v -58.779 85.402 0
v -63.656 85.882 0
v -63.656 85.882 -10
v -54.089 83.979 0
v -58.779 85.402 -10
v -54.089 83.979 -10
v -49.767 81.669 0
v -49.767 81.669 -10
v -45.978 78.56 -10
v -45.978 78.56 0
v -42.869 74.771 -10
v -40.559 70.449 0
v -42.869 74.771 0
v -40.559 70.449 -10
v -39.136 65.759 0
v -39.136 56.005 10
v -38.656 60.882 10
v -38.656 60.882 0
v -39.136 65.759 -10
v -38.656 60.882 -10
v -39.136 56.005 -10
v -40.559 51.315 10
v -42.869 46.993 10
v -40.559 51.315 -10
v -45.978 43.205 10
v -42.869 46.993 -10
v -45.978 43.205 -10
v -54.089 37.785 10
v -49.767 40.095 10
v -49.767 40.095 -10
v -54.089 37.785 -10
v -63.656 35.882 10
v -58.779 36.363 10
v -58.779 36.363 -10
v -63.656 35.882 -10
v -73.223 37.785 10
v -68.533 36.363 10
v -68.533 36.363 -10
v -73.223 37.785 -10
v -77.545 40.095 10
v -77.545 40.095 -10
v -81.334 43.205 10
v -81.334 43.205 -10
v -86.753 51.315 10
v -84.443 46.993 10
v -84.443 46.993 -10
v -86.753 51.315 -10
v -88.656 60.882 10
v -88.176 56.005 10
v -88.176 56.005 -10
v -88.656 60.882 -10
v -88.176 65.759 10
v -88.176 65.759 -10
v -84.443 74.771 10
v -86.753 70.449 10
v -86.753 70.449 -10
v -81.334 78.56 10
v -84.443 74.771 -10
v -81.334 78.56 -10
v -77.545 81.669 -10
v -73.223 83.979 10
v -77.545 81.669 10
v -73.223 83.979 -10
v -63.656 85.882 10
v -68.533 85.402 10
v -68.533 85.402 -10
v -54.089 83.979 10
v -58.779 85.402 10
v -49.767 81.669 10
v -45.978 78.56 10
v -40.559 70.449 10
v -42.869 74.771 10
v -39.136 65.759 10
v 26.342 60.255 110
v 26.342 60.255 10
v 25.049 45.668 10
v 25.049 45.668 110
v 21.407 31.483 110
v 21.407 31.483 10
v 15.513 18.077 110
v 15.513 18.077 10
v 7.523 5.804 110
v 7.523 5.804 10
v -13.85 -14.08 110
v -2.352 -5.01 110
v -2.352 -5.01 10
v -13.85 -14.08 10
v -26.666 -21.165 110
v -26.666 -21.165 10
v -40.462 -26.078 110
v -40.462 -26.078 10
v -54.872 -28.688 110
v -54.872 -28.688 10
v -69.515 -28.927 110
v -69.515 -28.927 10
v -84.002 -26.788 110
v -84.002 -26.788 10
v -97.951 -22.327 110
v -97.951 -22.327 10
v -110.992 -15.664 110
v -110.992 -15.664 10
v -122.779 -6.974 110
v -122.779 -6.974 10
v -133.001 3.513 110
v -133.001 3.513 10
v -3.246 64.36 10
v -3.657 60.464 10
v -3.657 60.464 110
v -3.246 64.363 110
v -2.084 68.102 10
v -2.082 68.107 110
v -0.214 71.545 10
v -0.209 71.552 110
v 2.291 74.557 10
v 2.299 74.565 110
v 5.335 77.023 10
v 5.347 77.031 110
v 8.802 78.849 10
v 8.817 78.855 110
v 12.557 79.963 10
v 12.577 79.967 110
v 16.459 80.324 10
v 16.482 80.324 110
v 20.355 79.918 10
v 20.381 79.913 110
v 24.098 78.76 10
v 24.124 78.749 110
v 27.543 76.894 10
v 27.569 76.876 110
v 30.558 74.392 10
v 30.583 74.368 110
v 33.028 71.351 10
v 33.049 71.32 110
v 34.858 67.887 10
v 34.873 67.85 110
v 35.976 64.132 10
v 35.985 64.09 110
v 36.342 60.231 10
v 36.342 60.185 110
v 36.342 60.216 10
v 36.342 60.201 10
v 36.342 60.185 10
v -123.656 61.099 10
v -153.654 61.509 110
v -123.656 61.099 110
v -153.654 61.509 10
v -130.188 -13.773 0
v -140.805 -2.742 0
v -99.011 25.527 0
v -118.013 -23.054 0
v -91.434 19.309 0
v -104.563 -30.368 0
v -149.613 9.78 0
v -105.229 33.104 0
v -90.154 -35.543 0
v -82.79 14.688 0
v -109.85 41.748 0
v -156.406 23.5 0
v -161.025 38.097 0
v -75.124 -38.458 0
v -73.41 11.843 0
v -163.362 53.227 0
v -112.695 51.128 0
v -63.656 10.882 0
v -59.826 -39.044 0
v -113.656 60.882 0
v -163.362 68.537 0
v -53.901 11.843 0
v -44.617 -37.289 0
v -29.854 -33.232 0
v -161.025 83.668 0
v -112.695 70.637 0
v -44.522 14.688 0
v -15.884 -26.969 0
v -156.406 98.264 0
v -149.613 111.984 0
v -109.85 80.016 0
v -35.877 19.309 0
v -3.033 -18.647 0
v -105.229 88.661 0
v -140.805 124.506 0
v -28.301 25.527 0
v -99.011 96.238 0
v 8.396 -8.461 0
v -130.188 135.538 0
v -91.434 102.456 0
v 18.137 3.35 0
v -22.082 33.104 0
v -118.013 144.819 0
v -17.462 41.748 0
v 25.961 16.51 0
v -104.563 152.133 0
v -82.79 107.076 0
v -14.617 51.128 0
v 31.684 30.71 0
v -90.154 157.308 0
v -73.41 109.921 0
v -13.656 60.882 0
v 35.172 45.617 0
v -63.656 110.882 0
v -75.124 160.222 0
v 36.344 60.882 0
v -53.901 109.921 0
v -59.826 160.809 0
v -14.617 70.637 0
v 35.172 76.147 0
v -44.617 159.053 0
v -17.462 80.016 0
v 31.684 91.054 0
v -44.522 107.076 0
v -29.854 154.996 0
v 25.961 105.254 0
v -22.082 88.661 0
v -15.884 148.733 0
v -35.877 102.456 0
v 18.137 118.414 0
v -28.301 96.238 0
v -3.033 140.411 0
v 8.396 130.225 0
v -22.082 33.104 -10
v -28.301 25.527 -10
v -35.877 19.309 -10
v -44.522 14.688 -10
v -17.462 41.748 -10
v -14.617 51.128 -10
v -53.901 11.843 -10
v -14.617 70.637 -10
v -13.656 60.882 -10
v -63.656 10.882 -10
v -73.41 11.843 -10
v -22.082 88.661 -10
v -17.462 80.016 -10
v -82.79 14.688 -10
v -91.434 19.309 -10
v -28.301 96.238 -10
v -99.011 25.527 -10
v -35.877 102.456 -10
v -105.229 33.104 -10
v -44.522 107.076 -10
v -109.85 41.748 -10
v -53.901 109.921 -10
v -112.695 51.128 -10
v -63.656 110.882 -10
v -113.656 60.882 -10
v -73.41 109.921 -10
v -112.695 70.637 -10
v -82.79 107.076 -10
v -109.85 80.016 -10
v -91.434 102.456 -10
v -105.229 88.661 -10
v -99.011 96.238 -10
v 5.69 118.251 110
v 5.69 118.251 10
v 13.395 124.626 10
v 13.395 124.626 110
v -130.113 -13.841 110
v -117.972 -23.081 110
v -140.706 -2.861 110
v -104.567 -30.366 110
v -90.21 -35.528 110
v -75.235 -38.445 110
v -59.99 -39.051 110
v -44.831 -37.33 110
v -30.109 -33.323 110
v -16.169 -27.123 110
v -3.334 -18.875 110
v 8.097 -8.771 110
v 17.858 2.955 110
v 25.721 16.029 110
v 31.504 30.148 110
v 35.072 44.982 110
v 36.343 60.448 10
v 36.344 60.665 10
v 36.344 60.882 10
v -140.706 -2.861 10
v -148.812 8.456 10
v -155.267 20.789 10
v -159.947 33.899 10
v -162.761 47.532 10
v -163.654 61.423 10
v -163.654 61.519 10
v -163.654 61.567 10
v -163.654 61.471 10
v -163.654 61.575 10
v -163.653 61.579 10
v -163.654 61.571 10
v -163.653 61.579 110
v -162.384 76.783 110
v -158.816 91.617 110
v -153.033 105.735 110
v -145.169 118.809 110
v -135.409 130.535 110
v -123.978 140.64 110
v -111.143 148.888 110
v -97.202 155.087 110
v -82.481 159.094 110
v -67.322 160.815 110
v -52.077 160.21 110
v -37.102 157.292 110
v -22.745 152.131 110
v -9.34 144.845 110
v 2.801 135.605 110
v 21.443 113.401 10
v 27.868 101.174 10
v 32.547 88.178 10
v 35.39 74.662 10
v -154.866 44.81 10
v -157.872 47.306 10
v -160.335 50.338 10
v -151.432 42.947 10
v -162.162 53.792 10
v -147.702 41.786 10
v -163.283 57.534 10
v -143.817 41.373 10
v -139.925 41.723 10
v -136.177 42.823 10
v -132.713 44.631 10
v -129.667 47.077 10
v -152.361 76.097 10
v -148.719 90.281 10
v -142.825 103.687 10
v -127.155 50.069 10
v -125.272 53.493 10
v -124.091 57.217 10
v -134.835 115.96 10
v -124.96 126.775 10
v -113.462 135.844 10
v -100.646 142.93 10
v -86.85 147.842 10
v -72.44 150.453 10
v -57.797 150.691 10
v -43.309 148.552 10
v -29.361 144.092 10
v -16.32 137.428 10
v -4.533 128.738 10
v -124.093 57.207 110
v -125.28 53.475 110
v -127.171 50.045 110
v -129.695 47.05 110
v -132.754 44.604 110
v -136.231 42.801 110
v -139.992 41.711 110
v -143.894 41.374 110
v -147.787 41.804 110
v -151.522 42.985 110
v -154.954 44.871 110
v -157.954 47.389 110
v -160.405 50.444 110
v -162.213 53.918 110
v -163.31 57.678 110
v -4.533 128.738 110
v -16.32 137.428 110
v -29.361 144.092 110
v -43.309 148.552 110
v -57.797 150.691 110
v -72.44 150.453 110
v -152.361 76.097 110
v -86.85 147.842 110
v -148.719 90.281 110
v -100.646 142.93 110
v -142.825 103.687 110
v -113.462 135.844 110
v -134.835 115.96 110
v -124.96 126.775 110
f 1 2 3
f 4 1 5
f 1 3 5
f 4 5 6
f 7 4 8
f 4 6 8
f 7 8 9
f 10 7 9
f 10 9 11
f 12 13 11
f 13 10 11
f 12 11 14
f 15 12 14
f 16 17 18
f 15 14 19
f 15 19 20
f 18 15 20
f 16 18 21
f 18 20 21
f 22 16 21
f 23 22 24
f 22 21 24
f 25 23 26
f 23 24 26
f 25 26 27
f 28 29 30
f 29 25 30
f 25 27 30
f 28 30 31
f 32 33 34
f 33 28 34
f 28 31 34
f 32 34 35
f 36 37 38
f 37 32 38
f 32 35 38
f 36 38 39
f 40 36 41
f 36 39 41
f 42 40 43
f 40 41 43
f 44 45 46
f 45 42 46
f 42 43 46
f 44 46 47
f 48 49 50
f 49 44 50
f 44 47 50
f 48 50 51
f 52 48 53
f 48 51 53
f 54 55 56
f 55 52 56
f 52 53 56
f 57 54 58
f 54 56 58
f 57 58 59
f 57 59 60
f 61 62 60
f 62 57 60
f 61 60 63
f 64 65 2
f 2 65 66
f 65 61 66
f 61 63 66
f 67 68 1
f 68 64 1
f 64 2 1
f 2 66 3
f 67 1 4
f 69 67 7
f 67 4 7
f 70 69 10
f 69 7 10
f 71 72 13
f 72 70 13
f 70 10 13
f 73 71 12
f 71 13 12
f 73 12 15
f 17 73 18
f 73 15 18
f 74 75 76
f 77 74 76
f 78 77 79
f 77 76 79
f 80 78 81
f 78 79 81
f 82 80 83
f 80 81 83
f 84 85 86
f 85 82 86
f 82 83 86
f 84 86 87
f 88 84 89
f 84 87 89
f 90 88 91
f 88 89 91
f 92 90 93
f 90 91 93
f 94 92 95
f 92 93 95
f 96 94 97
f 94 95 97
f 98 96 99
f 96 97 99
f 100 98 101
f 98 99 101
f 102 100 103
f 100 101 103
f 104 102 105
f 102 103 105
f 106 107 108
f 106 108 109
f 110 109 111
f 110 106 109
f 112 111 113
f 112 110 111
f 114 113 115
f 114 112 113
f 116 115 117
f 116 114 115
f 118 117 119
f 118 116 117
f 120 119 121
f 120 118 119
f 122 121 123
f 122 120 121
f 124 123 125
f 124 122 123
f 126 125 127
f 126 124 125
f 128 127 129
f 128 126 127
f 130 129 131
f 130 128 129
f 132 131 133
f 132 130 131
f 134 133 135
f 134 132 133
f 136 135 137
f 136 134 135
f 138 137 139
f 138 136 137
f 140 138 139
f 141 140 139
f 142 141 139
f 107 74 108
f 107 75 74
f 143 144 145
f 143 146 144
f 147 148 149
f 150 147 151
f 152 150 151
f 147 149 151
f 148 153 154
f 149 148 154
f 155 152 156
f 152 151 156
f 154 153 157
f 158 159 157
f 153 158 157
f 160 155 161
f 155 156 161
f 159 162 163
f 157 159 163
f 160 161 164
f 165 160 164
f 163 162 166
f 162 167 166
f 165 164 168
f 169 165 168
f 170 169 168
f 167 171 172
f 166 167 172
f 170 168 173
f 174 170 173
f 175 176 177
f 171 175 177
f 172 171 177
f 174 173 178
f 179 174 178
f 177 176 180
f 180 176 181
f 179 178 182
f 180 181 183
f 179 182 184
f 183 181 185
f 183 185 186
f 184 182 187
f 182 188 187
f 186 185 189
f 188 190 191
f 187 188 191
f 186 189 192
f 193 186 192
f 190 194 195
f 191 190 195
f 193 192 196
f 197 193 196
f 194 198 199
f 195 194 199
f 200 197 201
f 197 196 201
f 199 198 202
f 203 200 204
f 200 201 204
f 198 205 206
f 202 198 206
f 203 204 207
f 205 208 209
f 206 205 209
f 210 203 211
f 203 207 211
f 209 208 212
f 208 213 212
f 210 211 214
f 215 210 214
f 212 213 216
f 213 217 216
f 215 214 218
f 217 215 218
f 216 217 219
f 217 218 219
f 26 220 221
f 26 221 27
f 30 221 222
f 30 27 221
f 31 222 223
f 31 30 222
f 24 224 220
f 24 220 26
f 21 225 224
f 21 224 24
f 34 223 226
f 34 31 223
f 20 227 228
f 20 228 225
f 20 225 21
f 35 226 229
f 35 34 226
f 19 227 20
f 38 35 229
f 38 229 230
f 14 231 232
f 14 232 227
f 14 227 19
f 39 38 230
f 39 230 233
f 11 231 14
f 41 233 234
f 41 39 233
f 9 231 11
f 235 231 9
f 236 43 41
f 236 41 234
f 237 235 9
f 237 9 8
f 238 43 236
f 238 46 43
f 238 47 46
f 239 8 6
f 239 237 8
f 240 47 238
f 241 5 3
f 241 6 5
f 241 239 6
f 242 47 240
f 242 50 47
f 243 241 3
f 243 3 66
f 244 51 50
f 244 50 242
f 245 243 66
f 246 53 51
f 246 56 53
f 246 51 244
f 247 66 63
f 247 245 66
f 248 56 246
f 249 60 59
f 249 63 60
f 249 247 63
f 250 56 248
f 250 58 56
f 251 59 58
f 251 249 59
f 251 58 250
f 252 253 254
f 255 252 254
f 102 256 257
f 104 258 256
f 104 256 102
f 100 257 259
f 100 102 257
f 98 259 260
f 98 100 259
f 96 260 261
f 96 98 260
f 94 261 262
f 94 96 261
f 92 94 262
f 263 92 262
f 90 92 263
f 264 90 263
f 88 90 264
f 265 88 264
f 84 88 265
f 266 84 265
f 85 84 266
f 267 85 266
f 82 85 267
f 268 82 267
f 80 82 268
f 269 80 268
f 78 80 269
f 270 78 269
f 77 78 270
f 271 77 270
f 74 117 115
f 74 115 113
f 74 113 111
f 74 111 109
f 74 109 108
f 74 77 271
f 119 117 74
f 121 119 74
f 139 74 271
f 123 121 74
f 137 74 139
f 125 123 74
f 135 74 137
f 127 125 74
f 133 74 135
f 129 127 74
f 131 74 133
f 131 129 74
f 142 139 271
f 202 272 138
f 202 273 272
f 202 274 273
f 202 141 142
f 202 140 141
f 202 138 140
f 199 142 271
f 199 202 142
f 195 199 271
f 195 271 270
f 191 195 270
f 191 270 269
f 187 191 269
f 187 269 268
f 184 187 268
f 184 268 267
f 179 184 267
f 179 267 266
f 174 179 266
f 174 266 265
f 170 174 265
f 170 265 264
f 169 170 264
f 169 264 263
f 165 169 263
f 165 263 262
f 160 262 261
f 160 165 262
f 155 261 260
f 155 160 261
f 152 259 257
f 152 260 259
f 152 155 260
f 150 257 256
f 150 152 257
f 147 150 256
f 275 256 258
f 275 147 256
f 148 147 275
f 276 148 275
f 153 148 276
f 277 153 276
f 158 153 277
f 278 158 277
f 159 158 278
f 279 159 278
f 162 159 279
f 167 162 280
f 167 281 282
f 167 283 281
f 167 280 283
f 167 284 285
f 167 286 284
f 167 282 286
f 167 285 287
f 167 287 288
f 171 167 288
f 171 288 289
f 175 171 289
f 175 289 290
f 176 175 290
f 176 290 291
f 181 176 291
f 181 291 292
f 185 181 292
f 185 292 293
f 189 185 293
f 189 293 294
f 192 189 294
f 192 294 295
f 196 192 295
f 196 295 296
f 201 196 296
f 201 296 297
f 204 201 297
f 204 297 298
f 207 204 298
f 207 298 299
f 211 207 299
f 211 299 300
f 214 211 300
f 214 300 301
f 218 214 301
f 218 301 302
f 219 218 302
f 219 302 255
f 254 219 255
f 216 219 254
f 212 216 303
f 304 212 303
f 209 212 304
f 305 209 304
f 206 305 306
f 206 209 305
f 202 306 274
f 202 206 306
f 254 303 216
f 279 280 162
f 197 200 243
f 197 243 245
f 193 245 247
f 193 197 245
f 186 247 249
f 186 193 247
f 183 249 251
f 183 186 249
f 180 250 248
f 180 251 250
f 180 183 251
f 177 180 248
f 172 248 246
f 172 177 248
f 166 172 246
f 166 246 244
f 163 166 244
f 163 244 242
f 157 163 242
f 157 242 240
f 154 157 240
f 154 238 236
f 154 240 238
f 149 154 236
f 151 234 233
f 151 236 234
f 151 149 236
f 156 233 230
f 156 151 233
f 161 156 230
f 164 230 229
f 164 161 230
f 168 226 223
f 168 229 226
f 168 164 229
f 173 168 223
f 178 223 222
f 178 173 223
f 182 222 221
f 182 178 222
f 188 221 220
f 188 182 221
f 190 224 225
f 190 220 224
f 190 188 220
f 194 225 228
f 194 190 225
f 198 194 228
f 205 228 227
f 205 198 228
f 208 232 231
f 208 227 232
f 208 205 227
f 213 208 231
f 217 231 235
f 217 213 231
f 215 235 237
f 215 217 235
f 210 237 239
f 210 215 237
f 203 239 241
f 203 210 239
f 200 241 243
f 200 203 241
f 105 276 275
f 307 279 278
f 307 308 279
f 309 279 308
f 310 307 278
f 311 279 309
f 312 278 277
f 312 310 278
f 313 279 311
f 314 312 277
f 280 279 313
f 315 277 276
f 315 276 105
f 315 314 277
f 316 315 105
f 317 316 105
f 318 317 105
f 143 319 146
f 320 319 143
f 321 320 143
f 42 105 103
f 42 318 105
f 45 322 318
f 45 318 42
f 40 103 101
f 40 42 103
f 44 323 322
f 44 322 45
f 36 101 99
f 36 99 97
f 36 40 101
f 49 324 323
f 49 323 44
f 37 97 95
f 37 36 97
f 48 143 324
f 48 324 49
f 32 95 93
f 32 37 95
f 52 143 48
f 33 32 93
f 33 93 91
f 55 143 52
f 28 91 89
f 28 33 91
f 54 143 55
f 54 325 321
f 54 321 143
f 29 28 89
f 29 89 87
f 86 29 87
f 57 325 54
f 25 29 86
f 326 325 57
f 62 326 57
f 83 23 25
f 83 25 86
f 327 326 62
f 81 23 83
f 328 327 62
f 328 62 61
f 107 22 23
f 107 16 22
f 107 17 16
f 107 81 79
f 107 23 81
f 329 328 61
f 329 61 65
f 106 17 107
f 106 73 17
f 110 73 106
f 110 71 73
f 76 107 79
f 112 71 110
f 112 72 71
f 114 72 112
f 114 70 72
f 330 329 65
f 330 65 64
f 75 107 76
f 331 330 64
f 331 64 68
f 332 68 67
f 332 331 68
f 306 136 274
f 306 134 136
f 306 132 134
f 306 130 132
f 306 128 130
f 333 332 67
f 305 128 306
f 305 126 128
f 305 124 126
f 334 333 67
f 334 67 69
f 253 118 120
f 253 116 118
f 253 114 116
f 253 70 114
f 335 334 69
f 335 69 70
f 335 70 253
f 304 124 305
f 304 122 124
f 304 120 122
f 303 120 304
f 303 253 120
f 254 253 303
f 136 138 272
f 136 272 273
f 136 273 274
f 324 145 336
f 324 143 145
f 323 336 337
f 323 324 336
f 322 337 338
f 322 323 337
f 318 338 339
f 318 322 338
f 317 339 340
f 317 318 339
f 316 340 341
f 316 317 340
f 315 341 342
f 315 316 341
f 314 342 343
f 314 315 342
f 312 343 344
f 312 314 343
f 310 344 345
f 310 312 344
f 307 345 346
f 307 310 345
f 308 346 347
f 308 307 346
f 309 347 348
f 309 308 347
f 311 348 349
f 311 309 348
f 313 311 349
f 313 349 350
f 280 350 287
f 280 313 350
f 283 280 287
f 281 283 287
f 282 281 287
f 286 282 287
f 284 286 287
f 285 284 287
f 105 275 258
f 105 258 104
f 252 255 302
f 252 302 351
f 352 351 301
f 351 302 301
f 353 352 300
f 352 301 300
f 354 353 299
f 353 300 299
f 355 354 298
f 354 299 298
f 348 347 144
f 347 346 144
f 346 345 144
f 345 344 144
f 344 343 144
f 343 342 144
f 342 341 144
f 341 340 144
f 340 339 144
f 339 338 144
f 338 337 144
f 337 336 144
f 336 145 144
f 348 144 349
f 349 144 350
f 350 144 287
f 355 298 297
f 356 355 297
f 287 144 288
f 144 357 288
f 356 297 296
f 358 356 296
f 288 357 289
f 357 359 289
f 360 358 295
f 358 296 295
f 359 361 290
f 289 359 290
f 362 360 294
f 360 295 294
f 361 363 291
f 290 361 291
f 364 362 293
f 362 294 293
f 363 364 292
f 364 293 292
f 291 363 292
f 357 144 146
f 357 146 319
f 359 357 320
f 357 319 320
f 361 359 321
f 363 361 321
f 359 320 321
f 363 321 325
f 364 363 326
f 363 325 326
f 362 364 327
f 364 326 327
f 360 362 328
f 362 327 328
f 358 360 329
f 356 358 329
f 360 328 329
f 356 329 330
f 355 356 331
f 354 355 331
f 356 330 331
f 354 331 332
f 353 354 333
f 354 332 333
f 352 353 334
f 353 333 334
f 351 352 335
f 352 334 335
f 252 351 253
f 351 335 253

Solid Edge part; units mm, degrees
sketch "Sketch1" plane through (0, 0, 0) normal (0, 0, 1) x (1, 0, 0)
  circle A0 centre (-63.6559, 60.8822) radius 25
  circle A1 centre (-63.6559, 60.8822) radius 100
  dimension "D1" = 200
  dimension "D2" = 50
extrude "Protrusion1" add sketch "Sketch1" along normal blind 10
sketch "Sketch2" plane through (-63.6559, 60.8822, 10) normal (0, 0, 1) x (1, 0, 0)
  line L0 (-89.9978, 0.6271) -> (-60.0005, 0.217)
  arc A0 (-99.9976, 0.6968) -> (-60.0005, 0.217) centre (-79.9986, 0.4904) ccw
  arc A1 (-99.9976, 0.6968) -> (77.0504, 63.7435) centre (0, 0) cw
  line L1 (69.3454, 57.3691) -> (77.0504, 63.7435)
  arc A2 (-89.9978, 0.6271) -> (69.3454, 57.3691) centre (0, 0) cw
  arc A3 (-77.0504, -63.7435) -> (99.9976, -0.6968) centre (0, 0) ccw
  arc A4 (99.9976, -0.6968) -> (59.9985, -0.4181) centre (79.9981, -0.5574) ccw
  line L2 (89.9978, -0.6271) -> (59.9985, -0.4181)
  arc A5 (-69.3454, -57.3691) -> (89.9978, -0.6271) centre (0, 0) ccw
  line L3 (-77.0504, -63.7435) -> (-69.3454, -57.3691)
  dimension "D1" = 90
  dimension "D2" = 100
  dimension "D3" = 90
  dimension "D4" = 100
  dimension "D5" = 20
  dimension "D6" = 20
extrude "ExtrudedProtrusion_2" add sketch "Sketch2" along normal blind 100
sketch "Sketch3" plane through (-63.6559, 60.8822, 0) normal (0, 0, -1) x (0, 1, 0)
  circle A0 centre (0, 0) radius 25
  circle A1 centre (0, 0) radius 50
extrude "ExtrudedProtrusion_3" add sketch "Sketch3" along normal blind 10
